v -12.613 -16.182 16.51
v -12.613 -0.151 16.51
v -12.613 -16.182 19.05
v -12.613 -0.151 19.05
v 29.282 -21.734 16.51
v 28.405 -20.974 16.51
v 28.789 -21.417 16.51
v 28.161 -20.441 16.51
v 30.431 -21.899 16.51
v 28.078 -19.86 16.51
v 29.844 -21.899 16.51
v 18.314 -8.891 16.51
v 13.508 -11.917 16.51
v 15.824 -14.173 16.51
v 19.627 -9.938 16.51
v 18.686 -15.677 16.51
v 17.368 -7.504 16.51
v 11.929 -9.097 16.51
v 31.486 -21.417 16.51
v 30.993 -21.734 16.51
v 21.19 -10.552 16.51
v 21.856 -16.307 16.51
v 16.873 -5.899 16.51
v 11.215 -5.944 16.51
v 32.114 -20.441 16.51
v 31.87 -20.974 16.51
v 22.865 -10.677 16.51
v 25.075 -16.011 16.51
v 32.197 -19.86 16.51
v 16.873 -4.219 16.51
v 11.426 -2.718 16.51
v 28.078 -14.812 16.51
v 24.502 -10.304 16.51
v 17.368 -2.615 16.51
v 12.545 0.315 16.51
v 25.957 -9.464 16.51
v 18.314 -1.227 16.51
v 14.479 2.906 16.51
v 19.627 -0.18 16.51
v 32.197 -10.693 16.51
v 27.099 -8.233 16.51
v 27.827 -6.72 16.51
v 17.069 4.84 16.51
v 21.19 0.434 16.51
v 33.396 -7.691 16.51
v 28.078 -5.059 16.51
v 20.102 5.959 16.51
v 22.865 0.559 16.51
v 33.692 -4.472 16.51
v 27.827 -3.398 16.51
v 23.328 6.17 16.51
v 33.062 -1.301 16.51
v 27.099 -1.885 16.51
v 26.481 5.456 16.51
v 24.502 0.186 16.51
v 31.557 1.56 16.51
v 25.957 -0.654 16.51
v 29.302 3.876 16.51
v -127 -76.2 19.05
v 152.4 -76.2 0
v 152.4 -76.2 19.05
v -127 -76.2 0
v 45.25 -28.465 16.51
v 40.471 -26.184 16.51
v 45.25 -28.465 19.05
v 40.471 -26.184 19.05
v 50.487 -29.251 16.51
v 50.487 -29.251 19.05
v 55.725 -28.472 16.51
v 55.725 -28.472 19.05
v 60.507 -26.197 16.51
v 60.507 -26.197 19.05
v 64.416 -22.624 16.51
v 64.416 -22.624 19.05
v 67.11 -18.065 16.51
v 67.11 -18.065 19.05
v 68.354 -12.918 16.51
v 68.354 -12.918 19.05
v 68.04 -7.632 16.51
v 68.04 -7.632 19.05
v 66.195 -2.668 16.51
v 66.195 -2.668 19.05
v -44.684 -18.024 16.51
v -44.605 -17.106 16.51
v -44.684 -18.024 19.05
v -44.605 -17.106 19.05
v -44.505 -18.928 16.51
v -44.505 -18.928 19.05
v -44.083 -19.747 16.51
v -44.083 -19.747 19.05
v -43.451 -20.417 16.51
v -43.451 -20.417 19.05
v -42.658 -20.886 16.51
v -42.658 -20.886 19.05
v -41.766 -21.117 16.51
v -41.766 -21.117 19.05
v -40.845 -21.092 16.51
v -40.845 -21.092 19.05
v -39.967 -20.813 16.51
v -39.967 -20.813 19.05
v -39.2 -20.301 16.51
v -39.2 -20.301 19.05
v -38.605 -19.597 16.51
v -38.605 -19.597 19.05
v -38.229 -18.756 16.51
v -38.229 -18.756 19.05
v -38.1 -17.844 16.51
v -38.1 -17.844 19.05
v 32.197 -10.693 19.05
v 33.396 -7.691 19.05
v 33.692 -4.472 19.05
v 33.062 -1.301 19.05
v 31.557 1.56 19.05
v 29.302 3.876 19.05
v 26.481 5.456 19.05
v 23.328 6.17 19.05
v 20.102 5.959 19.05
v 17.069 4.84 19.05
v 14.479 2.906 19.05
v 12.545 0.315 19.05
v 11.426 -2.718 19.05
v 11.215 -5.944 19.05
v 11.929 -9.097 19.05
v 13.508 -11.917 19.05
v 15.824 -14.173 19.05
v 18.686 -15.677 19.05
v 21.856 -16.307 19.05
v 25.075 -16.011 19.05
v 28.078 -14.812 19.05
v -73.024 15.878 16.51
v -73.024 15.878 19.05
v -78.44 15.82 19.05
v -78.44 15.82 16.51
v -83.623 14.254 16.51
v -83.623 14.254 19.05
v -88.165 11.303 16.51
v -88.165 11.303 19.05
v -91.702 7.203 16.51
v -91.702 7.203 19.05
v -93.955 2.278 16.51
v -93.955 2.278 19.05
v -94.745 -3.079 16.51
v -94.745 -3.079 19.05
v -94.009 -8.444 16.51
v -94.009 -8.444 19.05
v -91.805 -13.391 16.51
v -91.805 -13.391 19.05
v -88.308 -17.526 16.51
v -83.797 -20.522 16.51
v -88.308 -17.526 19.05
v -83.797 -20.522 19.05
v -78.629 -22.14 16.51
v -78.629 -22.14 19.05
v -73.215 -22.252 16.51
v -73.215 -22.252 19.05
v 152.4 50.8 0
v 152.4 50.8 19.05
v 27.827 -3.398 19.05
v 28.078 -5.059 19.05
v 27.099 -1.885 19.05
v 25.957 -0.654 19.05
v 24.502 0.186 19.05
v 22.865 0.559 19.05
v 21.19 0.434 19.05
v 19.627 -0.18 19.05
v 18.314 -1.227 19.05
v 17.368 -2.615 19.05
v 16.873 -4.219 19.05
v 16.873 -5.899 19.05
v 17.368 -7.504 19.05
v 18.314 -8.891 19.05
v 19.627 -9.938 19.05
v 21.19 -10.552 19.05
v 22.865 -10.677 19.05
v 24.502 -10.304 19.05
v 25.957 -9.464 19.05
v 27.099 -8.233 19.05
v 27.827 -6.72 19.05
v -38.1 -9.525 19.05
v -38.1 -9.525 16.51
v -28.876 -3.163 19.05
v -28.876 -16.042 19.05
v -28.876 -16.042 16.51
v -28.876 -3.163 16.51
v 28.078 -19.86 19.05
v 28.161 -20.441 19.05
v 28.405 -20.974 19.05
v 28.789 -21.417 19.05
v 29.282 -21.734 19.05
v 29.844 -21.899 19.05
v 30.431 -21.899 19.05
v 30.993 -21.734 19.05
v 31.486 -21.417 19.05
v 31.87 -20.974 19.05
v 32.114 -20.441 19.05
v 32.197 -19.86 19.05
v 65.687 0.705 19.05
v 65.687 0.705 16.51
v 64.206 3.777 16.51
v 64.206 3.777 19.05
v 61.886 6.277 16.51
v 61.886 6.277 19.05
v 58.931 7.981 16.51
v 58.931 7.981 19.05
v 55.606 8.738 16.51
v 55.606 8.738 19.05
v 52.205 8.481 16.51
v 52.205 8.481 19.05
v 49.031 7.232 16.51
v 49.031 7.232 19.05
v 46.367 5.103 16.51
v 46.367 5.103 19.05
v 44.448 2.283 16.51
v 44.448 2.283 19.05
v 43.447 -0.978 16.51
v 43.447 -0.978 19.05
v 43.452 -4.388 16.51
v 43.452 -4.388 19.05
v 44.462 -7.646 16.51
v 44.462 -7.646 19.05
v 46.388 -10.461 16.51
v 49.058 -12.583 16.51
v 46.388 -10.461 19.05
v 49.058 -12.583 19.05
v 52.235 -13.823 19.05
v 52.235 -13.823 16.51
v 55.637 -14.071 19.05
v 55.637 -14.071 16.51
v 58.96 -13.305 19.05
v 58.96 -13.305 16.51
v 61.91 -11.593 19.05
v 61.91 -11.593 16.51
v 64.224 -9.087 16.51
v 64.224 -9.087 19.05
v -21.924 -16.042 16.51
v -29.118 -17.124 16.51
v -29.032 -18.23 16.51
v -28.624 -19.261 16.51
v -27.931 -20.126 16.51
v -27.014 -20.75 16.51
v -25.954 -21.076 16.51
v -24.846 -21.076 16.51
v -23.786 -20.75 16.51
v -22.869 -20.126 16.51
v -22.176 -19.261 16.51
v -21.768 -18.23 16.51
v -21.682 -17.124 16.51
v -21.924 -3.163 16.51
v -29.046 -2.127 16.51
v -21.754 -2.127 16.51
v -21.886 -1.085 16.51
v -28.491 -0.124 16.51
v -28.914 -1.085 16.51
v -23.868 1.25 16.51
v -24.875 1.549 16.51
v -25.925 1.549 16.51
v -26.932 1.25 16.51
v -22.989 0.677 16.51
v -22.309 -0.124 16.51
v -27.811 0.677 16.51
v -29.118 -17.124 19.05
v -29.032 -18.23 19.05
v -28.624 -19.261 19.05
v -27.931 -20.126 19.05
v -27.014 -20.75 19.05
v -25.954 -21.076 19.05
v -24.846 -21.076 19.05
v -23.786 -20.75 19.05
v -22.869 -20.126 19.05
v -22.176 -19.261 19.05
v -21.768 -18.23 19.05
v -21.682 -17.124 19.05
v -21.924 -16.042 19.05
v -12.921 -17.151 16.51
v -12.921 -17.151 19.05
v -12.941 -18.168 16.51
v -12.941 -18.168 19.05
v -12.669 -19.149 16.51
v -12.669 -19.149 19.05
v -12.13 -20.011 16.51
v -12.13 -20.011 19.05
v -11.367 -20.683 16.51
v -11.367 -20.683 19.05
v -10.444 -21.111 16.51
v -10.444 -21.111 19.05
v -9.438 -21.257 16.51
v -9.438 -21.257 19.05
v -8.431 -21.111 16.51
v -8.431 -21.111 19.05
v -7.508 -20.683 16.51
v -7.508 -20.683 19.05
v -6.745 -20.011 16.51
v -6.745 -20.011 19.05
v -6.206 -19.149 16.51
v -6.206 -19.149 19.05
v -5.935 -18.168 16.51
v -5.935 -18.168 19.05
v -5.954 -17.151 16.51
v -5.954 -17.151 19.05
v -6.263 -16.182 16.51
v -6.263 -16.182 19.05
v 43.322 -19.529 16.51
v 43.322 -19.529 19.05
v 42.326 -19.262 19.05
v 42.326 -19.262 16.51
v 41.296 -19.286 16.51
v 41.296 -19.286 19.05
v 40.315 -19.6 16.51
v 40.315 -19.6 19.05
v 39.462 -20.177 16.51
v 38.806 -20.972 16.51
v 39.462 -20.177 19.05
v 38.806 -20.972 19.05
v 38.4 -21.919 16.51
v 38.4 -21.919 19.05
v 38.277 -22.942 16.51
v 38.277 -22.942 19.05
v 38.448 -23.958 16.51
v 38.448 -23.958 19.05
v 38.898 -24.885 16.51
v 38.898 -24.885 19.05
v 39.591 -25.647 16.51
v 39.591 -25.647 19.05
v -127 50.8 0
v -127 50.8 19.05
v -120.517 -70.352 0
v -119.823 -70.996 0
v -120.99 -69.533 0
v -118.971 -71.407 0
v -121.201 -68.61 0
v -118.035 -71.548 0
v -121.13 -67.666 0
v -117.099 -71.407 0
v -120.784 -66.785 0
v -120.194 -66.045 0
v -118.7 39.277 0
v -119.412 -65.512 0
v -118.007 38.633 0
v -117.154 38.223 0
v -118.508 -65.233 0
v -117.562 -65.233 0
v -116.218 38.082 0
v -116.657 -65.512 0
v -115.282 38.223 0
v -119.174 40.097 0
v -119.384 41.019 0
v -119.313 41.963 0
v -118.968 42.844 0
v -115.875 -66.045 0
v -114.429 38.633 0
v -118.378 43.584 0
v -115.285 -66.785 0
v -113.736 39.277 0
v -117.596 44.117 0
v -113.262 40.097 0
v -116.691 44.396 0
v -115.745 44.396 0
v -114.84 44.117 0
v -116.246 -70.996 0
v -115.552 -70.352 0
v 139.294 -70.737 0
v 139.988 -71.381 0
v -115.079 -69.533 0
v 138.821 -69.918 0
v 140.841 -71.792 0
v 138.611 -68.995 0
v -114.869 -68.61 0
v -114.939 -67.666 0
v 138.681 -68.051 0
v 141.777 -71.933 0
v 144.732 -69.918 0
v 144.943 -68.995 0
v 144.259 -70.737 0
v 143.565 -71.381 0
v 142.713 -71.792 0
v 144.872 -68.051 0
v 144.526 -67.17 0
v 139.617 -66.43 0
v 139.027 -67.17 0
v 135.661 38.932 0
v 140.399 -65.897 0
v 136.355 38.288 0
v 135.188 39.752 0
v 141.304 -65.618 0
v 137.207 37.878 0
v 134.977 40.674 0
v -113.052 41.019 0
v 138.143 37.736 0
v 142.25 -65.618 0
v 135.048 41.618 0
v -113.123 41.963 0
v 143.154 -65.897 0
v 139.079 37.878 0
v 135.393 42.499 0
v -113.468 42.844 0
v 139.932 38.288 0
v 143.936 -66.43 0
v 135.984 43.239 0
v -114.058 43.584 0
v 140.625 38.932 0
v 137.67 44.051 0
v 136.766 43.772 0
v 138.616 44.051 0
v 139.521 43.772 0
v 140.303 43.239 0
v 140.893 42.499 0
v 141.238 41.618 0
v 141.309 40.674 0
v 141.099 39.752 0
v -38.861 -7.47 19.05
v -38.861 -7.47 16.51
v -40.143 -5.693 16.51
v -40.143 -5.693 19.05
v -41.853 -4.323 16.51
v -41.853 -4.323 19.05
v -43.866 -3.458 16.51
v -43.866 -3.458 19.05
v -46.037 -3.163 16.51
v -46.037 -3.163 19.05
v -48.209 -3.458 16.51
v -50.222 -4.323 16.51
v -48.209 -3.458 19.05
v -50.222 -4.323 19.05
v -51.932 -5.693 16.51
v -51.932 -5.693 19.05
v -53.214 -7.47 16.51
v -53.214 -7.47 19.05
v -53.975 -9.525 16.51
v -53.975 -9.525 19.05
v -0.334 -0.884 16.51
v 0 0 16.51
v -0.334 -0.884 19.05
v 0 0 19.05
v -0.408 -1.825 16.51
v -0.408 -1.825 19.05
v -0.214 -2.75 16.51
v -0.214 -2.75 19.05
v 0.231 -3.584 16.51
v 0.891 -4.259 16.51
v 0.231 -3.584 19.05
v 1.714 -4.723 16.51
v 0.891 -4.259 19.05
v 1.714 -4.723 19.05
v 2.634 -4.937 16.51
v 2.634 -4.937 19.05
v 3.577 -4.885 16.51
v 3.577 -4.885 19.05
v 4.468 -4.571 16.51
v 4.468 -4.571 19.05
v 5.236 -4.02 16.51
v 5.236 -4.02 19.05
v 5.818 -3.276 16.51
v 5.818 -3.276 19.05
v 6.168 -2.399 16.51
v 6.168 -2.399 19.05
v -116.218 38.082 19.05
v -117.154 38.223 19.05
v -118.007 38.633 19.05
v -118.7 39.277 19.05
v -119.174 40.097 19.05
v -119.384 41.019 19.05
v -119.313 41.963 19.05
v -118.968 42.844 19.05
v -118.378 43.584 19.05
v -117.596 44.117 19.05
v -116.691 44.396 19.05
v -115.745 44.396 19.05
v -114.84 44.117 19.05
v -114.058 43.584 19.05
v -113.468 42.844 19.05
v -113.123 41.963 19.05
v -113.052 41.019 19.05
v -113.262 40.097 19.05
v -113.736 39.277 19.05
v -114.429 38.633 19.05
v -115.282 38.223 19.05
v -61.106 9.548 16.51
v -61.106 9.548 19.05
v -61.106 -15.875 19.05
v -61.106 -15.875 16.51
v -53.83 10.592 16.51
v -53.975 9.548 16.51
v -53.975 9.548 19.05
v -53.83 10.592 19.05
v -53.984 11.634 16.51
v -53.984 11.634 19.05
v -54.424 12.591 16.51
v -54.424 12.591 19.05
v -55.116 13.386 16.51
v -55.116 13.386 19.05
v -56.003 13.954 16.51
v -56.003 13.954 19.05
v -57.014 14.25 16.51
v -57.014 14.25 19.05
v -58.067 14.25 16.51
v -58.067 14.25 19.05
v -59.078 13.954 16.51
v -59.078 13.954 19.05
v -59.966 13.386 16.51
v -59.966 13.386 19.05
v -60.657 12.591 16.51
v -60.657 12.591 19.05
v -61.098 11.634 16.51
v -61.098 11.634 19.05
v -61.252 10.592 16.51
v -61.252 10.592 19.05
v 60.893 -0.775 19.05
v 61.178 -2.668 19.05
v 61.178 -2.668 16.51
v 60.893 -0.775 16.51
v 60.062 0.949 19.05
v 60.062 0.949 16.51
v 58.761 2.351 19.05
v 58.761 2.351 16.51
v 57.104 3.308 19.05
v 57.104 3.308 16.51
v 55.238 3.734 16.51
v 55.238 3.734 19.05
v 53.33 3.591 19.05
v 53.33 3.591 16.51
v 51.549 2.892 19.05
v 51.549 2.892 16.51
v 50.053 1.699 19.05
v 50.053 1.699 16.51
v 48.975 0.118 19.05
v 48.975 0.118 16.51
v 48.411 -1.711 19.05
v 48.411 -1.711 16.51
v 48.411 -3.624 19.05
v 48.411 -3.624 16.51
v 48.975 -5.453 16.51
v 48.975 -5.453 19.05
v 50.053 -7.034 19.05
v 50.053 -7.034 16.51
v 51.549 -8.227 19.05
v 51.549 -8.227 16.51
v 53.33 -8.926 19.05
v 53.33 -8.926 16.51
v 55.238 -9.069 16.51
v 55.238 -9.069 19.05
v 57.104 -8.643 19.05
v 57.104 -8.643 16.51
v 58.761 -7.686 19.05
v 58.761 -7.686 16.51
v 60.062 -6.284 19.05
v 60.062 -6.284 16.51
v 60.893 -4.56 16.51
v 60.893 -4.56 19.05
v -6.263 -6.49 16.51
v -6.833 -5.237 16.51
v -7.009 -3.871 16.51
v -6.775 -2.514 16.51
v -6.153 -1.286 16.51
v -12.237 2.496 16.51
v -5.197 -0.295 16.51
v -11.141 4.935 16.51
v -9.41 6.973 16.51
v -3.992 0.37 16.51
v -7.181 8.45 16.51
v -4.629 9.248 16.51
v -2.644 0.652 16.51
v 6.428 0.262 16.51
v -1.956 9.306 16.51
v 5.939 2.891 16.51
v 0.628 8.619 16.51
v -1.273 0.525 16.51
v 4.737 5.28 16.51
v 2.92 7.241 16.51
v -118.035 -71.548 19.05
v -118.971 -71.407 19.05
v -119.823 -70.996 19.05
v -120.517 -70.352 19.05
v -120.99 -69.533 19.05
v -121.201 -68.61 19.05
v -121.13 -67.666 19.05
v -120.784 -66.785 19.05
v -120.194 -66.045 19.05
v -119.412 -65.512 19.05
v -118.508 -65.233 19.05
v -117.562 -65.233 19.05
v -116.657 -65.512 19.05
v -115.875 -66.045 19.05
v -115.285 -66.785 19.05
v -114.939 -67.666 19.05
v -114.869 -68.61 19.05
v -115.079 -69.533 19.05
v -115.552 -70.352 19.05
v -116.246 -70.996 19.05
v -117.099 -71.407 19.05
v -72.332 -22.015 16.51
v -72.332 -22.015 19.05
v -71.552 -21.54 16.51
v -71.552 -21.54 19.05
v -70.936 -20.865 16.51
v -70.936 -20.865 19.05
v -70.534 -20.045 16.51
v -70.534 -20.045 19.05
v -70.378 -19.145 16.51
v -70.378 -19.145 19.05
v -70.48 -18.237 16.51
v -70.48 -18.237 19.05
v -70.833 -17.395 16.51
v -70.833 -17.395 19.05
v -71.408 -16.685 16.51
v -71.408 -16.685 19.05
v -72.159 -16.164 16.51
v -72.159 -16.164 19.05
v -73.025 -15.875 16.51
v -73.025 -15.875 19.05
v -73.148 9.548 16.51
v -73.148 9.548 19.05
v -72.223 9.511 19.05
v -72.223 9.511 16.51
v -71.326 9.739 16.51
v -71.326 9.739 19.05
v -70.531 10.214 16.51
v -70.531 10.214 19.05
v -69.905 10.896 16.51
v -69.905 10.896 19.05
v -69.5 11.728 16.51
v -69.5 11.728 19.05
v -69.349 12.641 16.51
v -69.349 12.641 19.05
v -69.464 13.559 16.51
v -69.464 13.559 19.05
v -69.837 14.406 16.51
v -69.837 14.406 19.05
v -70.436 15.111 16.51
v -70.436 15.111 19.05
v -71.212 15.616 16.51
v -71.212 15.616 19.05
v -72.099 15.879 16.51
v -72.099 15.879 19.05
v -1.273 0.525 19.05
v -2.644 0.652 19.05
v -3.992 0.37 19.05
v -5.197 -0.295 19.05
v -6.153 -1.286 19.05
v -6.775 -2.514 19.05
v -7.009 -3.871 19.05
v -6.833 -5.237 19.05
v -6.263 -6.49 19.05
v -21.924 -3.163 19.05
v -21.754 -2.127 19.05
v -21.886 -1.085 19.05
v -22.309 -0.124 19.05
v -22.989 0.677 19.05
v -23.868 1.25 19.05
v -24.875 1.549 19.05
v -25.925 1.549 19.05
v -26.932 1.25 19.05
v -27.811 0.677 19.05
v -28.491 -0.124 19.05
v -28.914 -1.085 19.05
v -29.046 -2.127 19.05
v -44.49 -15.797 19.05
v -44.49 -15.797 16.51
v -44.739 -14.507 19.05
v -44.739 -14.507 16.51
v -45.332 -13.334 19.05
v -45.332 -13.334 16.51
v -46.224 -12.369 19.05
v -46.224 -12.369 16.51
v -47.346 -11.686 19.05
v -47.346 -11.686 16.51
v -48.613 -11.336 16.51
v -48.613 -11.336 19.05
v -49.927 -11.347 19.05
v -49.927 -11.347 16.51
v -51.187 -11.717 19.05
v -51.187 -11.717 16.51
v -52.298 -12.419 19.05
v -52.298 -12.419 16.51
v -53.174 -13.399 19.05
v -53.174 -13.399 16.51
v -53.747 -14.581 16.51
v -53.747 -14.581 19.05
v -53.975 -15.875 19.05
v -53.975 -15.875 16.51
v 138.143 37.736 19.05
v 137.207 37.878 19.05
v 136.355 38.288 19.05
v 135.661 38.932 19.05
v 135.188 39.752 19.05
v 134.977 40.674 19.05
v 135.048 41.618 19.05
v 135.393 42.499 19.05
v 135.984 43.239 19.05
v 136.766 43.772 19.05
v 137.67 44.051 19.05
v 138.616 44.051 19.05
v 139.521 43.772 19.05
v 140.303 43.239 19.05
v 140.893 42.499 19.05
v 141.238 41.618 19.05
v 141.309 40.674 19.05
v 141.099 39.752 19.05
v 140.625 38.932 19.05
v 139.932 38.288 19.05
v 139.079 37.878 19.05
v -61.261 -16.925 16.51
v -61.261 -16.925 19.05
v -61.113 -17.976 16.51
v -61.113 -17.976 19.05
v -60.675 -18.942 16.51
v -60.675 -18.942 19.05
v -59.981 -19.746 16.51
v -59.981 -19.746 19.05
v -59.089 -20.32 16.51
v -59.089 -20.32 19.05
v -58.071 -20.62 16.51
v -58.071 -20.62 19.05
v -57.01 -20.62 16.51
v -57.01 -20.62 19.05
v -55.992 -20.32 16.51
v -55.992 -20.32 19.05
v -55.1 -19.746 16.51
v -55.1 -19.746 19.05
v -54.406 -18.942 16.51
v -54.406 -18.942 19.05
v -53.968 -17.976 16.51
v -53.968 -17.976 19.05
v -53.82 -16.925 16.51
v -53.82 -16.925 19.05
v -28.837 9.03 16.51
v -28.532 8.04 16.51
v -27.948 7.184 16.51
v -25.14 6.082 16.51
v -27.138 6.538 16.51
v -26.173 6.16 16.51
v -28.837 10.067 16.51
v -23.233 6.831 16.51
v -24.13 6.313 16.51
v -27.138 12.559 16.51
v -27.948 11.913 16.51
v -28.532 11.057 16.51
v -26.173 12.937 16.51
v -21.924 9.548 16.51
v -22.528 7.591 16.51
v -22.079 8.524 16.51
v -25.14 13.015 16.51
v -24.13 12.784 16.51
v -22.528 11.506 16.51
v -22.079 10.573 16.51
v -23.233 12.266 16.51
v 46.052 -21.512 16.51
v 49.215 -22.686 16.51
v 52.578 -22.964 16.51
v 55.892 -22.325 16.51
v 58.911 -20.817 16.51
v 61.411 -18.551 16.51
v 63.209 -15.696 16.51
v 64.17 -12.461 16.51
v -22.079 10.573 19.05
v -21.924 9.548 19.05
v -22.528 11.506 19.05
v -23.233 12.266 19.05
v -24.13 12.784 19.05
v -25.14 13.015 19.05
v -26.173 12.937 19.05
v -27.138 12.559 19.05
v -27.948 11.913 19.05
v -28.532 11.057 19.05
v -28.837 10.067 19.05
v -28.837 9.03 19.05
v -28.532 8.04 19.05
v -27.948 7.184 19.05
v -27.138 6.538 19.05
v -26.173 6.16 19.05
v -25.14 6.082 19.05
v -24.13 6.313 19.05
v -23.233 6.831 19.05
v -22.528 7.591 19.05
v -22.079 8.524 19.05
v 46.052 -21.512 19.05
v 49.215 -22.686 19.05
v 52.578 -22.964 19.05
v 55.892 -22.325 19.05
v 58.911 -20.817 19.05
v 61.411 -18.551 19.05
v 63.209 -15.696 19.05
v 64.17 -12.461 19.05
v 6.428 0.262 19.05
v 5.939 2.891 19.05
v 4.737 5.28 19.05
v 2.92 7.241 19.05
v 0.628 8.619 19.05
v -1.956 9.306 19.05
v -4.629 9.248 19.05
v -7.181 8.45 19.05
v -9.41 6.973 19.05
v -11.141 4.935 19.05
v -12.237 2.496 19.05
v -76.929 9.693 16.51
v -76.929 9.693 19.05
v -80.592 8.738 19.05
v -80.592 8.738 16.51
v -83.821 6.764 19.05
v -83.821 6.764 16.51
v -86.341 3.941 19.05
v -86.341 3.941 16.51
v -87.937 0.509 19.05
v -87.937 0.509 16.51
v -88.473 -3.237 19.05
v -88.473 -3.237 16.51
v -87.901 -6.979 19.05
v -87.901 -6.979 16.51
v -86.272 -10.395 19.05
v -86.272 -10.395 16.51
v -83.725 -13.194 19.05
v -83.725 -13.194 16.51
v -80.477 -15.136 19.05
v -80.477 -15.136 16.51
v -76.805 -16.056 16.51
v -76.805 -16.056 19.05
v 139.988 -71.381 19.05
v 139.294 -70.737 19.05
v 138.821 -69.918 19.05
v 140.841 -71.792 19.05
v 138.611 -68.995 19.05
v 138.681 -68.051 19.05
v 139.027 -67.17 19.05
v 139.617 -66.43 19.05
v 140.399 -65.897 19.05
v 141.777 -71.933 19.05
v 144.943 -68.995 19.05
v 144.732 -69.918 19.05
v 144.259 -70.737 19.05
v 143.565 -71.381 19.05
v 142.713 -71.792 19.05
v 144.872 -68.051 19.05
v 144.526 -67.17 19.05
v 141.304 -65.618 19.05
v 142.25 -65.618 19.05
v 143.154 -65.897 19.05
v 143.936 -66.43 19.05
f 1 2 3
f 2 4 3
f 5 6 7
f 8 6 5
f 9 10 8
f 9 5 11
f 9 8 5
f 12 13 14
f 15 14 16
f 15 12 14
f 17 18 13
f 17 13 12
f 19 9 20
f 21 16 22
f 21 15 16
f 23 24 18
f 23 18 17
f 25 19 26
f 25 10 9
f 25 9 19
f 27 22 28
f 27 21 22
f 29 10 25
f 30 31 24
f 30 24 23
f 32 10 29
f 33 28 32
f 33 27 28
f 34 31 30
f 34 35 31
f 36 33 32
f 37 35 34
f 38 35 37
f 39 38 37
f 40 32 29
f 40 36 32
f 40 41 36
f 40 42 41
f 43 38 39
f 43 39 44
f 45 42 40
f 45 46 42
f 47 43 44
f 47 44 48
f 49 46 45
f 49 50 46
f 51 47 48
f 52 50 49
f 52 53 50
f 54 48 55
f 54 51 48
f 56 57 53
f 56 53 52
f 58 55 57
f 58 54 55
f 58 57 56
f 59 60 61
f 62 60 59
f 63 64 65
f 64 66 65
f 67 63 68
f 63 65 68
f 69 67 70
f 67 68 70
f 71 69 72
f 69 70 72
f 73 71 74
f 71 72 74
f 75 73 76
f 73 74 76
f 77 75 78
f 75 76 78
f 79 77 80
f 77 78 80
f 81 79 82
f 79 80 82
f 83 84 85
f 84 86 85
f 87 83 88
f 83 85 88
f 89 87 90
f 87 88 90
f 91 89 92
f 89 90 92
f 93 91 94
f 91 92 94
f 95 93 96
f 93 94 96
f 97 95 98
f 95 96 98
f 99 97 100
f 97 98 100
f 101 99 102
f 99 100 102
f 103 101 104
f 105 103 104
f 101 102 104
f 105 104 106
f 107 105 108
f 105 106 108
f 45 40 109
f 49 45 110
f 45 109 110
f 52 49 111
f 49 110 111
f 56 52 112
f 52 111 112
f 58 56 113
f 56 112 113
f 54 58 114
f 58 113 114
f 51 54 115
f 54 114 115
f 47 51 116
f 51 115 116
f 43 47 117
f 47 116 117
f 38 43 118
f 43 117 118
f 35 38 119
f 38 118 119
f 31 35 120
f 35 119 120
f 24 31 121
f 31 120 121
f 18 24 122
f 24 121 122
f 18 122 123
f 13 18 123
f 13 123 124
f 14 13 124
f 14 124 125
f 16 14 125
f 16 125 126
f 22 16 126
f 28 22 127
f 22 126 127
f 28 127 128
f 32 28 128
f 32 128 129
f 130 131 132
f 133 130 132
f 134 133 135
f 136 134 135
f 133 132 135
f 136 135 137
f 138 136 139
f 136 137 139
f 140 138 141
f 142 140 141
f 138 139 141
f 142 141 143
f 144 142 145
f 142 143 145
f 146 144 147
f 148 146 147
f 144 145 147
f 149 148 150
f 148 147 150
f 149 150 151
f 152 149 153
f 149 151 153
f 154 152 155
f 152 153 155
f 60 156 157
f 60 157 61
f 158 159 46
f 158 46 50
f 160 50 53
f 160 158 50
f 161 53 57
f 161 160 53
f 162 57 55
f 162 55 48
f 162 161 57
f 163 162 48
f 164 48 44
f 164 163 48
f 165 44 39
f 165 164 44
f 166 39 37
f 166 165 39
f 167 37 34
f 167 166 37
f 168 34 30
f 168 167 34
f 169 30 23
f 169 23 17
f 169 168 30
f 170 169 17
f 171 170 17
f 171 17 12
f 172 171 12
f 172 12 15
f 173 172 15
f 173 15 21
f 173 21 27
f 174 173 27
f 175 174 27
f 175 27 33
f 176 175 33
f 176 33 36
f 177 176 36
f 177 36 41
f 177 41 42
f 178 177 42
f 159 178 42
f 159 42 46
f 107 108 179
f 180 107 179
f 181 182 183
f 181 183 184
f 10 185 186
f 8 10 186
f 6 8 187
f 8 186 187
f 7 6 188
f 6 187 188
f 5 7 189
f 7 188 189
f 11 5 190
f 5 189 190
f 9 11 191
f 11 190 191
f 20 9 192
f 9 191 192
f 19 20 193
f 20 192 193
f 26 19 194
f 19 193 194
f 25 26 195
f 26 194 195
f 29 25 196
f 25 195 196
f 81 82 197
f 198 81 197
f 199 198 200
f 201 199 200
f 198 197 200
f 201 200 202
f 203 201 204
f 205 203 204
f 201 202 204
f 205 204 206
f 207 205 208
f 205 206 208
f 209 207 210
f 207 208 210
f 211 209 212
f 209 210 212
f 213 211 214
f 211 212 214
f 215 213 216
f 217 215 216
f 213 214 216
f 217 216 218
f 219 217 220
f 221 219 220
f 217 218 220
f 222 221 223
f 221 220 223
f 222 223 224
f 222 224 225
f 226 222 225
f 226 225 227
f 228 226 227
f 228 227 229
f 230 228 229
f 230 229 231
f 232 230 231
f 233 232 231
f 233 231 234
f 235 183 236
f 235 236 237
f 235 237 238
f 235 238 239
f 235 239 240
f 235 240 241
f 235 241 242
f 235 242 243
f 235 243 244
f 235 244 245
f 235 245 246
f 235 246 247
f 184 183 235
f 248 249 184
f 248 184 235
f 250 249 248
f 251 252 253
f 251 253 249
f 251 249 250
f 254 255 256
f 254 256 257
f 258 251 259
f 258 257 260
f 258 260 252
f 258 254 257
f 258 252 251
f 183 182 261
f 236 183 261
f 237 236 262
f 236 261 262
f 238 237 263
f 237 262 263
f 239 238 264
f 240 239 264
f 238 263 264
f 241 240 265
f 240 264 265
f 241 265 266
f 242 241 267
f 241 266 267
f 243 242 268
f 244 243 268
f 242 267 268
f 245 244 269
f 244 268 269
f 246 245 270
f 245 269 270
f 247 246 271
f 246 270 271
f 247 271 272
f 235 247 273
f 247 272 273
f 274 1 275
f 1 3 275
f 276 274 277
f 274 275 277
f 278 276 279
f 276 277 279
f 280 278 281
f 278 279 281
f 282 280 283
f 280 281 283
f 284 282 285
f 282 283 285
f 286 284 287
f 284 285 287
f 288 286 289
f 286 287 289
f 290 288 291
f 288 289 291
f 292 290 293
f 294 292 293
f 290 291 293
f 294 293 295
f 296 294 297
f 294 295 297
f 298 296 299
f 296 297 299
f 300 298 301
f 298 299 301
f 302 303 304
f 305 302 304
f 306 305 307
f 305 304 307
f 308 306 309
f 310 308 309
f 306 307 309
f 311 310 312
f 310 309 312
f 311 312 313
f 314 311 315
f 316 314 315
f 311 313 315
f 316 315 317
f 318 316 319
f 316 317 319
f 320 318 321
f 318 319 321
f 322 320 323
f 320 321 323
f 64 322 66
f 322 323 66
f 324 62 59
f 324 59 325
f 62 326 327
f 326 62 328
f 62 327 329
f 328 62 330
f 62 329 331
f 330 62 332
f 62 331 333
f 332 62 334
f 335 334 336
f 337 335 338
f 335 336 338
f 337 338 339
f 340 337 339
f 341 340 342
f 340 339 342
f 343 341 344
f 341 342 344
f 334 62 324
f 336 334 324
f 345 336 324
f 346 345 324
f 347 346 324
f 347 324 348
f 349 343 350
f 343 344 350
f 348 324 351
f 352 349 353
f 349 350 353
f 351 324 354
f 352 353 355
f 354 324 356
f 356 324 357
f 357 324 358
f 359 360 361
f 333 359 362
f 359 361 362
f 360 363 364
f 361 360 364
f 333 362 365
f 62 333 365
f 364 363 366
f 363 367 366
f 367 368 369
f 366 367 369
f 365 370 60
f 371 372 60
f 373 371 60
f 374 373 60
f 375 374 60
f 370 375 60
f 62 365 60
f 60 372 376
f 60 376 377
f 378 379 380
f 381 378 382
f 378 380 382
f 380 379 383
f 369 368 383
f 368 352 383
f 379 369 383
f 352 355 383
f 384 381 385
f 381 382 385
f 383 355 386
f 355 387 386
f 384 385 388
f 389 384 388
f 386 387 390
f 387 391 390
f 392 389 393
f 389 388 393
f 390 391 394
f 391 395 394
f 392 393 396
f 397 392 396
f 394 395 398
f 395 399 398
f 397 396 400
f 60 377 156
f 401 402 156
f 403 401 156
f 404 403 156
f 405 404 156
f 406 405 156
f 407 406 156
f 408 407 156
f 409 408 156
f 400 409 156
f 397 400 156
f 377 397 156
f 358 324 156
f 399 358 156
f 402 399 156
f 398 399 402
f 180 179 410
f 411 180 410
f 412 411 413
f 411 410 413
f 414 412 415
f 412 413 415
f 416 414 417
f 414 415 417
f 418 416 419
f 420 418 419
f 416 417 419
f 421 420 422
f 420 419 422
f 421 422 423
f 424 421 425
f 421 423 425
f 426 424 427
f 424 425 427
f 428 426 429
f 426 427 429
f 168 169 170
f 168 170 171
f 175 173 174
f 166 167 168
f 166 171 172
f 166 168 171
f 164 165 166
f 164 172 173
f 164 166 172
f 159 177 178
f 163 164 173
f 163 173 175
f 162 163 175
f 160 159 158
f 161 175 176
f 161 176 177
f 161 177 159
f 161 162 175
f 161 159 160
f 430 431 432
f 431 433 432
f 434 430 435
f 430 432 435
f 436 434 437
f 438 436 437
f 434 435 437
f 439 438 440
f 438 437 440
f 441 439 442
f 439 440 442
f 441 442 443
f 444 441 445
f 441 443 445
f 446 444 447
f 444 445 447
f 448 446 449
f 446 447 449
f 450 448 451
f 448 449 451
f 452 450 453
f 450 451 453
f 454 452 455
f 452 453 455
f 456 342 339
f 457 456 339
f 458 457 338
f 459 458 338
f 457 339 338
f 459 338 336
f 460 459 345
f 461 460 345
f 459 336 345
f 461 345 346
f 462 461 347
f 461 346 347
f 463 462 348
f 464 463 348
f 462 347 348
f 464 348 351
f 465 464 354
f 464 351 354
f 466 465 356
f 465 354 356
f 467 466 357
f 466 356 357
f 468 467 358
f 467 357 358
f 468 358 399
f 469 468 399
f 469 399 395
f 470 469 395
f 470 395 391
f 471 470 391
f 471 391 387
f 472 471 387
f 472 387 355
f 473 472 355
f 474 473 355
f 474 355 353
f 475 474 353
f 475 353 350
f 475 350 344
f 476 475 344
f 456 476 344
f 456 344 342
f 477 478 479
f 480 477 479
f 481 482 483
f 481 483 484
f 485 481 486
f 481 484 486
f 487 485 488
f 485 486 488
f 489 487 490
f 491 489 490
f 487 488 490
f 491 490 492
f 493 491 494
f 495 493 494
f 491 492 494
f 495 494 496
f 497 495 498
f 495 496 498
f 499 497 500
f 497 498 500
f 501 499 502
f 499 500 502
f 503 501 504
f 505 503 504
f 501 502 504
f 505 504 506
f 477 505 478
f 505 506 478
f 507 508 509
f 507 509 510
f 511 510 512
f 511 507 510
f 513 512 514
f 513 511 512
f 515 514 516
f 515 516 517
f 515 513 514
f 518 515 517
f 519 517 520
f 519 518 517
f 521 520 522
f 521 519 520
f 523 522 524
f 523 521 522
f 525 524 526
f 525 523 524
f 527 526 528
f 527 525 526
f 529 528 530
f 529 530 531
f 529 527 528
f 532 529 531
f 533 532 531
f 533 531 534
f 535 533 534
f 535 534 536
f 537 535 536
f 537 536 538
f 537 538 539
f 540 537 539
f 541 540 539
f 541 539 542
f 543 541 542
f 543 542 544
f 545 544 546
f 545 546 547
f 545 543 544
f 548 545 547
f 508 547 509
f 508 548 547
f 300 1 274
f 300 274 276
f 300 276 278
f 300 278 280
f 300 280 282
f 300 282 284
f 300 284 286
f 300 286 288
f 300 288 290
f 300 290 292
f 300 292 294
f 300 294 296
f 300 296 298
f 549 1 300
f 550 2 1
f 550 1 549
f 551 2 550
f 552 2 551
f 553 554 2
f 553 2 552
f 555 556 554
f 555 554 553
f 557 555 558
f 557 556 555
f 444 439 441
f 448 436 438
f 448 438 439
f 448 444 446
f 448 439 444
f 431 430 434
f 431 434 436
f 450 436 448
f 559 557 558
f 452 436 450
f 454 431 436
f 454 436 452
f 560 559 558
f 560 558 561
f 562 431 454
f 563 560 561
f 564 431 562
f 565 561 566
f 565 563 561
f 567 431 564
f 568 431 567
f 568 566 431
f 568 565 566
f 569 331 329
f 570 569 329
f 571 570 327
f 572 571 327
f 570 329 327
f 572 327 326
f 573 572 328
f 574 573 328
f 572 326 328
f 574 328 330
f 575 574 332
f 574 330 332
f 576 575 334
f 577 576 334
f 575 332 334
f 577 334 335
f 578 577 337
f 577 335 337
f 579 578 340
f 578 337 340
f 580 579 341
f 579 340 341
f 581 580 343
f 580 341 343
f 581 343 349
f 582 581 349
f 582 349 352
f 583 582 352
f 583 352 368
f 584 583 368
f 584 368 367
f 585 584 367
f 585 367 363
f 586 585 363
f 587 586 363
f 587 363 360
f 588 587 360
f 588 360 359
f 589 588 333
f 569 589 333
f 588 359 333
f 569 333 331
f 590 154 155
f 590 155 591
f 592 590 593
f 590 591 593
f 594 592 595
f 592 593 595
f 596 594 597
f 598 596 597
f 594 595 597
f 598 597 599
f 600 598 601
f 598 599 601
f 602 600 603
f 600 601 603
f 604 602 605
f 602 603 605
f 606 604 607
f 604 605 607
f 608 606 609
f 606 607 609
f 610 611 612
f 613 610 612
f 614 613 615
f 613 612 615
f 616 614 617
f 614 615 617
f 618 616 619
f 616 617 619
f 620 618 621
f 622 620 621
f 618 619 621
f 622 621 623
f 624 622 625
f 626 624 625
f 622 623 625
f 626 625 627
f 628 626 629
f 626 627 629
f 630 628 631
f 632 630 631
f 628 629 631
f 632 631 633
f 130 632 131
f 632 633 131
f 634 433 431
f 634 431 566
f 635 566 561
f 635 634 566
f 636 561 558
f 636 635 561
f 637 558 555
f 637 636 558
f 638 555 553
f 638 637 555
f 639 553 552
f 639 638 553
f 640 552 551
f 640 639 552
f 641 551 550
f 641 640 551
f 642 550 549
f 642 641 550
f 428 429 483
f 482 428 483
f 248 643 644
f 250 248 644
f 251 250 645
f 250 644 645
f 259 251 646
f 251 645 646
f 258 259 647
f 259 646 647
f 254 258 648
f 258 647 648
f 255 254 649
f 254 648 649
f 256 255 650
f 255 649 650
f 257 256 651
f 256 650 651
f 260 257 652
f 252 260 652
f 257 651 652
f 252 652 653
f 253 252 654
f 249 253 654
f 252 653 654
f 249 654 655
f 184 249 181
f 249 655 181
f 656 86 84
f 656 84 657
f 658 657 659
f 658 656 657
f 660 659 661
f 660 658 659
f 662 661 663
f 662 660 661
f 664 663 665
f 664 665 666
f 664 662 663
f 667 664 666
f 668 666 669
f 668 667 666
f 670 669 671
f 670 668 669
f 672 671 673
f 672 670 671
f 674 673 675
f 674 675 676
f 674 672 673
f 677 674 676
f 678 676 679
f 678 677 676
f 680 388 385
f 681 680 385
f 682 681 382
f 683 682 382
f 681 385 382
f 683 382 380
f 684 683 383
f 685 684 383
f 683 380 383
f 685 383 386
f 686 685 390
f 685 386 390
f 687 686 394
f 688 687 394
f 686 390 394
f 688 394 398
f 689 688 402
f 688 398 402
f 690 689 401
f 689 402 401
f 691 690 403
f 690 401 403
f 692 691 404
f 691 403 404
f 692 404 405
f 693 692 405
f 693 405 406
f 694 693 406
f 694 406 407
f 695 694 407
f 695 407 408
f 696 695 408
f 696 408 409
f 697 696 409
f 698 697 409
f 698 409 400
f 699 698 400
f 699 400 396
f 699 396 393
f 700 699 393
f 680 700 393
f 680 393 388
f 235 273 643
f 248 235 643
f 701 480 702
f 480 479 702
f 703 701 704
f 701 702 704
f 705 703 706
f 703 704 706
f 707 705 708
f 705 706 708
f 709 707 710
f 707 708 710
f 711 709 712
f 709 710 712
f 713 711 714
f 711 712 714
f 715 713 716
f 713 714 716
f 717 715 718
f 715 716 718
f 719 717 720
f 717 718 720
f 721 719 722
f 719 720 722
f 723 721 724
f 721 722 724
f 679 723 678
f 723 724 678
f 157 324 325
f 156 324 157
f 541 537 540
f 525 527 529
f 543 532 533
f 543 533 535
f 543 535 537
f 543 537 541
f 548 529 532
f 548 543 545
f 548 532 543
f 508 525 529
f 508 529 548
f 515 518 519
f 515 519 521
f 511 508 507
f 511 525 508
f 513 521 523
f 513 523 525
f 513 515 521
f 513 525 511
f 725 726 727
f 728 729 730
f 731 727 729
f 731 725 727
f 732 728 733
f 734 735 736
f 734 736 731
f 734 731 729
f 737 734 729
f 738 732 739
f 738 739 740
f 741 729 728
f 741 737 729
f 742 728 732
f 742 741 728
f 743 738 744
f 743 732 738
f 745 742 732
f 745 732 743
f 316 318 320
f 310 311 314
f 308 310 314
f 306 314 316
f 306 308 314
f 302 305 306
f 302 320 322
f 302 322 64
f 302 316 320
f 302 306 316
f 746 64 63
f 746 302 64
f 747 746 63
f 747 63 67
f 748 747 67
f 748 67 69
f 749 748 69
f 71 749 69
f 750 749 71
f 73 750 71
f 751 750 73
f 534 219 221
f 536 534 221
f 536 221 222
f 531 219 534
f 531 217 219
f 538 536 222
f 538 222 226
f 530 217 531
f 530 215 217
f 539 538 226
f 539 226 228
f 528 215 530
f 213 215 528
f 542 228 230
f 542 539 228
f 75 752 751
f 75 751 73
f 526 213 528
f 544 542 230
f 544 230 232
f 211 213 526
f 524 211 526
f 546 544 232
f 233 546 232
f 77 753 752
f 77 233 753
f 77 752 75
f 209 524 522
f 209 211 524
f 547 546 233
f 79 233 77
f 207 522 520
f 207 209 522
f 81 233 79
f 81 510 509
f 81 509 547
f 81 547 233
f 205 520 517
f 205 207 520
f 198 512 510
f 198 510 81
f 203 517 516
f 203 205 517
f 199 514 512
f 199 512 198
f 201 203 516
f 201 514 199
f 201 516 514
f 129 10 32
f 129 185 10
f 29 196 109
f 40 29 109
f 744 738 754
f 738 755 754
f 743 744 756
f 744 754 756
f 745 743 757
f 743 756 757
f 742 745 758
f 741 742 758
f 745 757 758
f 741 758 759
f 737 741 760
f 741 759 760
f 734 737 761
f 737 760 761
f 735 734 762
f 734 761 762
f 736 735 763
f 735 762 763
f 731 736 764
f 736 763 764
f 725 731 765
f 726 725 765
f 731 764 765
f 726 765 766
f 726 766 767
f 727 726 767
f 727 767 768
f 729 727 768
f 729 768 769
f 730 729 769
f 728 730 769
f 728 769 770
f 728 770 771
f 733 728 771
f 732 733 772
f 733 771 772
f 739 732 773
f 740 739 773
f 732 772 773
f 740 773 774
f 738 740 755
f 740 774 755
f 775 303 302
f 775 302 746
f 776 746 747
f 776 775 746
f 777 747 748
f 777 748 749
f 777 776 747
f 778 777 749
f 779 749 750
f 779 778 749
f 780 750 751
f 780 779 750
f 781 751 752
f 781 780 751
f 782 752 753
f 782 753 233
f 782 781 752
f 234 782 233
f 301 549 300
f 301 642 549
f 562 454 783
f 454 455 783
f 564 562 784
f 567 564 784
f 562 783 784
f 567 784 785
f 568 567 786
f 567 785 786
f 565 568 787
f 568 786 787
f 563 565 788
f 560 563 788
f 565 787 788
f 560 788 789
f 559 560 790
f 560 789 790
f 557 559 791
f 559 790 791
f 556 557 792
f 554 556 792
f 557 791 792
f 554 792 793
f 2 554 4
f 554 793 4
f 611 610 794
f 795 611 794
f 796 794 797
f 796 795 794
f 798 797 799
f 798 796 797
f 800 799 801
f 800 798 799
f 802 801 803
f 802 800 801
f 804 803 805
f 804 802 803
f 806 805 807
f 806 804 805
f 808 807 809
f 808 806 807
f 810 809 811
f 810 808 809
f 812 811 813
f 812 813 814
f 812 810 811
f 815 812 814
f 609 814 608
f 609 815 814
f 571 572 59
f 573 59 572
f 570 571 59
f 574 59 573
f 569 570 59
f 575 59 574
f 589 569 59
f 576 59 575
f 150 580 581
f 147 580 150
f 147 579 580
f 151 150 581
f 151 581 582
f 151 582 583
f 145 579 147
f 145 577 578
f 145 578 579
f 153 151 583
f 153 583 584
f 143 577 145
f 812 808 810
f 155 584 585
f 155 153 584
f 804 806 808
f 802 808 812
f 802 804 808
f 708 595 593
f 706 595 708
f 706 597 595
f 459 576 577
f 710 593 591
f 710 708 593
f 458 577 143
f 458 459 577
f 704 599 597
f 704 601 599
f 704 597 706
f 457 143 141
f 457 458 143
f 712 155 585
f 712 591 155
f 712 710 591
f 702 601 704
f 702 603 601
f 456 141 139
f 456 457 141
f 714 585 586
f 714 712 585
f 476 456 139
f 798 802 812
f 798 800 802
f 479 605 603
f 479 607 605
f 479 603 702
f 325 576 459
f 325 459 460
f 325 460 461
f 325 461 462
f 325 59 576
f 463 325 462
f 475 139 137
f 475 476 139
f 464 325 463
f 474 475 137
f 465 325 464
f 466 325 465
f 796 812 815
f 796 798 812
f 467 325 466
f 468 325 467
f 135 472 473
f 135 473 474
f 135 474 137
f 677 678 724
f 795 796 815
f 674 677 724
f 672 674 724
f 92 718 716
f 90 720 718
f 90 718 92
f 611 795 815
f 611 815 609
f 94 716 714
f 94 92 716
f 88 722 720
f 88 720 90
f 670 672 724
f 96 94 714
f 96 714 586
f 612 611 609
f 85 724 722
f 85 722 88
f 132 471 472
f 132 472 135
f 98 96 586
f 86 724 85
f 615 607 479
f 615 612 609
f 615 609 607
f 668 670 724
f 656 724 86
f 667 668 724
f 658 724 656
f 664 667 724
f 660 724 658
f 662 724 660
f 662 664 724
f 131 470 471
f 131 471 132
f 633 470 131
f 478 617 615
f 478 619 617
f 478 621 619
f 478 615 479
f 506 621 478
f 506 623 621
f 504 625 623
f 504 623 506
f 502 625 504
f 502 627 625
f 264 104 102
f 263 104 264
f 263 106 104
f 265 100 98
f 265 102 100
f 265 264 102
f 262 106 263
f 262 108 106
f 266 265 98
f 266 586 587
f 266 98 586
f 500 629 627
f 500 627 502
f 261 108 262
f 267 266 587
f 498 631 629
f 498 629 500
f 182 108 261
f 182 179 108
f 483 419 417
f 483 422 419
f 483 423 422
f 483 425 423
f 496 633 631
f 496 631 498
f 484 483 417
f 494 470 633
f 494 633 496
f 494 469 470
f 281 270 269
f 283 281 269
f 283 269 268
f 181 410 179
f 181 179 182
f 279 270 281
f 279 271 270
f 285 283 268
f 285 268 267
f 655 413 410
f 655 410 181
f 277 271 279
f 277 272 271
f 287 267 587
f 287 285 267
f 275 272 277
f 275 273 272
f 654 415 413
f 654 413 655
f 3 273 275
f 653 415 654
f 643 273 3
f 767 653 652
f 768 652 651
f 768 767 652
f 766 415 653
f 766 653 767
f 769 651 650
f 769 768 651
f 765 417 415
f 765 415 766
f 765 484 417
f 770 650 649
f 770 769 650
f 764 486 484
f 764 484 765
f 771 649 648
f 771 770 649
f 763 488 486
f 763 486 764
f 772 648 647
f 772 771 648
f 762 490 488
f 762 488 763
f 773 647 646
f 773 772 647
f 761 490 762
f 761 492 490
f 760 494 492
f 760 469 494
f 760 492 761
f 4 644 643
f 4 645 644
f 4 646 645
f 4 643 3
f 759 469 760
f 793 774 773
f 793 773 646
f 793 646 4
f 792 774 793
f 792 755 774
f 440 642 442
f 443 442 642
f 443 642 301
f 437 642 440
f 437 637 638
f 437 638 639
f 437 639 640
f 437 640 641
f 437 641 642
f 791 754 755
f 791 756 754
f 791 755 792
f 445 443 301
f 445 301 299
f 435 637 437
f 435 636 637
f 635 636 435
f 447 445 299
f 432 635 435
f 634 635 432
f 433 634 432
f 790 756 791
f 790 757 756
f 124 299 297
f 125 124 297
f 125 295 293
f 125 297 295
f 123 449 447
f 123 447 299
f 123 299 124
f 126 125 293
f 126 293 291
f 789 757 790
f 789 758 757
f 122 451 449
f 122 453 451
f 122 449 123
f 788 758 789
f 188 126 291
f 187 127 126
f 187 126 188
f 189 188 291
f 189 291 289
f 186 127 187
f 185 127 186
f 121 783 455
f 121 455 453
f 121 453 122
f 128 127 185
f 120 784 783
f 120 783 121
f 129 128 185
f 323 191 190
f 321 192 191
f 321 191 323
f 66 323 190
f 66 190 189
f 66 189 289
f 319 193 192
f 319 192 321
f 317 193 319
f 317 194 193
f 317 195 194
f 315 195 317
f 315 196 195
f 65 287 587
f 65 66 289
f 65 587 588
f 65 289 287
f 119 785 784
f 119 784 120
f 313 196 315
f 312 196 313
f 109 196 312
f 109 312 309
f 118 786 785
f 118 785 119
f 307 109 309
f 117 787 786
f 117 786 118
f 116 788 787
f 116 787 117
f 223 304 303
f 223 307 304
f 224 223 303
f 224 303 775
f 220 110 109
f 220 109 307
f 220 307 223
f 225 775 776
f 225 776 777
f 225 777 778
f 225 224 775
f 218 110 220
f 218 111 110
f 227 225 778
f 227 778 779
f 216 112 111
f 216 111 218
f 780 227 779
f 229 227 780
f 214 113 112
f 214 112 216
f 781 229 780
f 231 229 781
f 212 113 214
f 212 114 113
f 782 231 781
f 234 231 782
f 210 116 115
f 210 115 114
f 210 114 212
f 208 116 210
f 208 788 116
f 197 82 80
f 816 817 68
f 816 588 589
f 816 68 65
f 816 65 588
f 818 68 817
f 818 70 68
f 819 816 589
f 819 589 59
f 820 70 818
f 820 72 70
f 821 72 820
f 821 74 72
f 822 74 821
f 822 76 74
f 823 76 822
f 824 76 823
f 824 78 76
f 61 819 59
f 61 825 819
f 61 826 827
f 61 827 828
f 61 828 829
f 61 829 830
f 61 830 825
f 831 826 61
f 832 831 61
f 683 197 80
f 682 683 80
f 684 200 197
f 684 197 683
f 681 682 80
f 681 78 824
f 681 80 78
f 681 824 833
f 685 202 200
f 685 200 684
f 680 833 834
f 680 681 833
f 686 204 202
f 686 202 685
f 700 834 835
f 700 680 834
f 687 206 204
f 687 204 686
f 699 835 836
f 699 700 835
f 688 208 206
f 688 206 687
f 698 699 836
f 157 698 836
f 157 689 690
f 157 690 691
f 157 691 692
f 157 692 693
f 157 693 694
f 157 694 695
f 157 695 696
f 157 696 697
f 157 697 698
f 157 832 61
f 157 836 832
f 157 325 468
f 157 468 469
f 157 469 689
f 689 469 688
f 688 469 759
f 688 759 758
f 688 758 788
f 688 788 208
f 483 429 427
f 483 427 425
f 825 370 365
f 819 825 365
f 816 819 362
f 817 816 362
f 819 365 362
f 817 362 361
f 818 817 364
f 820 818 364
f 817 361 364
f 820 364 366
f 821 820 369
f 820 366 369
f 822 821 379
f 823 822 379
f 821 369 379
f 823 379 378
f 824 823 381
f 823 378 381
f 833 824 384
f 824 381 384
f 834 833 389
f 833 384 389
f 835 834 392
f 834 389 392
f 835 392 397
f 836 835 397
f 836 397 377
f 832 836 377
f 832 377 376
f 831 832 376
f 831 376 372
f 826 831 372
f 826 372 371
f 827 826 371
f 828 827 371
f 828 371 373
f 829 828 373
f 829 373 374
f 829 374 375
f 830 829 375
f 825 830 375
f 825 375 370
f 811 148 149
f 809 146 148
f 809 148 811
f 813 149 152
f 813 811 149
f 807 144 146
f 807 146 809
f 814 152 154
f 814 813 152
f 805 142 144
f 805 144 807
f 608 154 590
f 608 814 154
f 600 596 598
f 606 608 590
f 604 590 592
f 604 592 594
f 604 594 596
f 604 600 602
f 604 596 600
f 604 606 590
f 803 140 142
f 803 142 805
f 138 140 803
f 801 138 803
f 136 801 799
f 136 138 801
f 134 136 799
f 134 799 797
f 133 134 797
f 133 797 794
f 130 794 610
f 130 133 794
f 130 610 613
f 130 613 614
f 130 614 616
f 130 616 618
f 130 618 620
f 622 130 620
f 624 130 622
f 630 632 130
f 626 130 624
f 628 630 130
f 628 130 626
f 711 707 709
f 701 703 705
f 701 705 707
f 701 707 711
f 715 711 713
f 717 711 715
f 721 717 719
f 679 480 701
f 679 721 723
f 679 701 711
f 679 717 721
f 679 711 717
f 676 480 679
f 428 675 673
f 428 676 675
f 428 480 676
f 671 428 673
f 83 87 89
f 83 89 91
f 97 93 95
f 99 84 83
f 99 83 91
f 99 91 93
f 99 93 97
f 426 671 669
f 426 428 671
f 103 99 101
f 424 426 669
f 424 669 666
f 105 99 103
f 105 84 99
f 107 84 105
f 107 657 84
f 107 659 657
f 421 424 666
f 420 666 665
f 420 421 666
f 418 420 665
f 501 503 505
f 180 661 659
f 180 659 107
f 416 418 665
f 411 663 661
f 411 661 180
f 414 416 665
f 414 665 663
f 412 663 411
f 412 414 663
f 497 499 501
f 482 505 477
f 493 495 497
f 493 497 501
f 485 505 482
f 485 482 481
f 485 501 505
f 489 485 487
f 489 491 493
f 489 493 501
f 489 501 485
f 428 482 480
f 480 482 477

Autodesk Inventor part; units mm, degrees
ref_plane "YZ Plane" through (0, 0, 0) normal (1, 0, 0) x (0, 1, 0)
ref_plane "XZ Plane" through (0, 0, 0) normal (0, 1, 0) x (-1, 0, 0)
ref_plane "XY Plane" through (0, 0, 0) normal (0, 0, 1) x (1, 0, 0)
sketch "Sketch1" plane through (0, 0, 0) normal (0, 0, 1) x (1, 0, 0)
  line L0 (-127, 50.8) -> (152.4, 50.8)
  line L1 (152.4, 50.8) -> (152.4, -76.2)
  line L2 (152.4, -76.2) -> (-127, -76.2)
  line L3 (-127, -76.2) -> (-127, 50.8)
  point P0 (0, 0)
  dimension "d0" = 127
  dimension "d1" = 279.4
extrude "Extrusion1" add sketch "Sketch1" along normal blind 19.05
sketch "Sketch2" plane through (0, 0, 19.05) normal (0, 0, 1) x (1, 0, 0)
  arc A0 (-73.0244, 15.878) -> (-73.0246, -22.228) centre (-75.5284, -3.175) ccw
  arc A1 (-73.1475, 9.5485) -> (-73.025, -15.875) centre (-75.5284, -3.175) ccw
  arc A2 (-73.1475, 9.5485) -> (-73.0244, 15.878) centre (-72.5572, 12.703) ccw
  arc A3 (-73.2146, -22.252) -> (-73.025, -15.875) centre (-73.603, -19.0491) ccw
  line L0 (-61.1063, -15.875) -> (-61.1063, 9.5485)
  arc A4 (-61.1063, -15.875) -> (-53.975, -15.875) centre (-57.5407, -16.9375) ccw
  arc A5 (-53.975, 9.5485) -> (-61.1063, 9.5485) centre (-57.5407, 10.5766) ccw
  line L1 (-53.975, 9.5485) -> (-53.975, -9.525)
  arc A6 (-38.1, -9.525) -> (-53.975, -9.525) centre (-46.0375, -11.2959) ccw
  line L2 (-38.1, -9.525) -> (-38.1, -17.8441)
  arc A7 (-44.6048, -17.106) -> (-38.1, -17.8441) centre (-41.3943, -17.8441) ccw
  arc A8 (-44.6048, -17.106) -> (-53.975, -15.875) centre (-49.231, -16.0424) ccw
  circle A9 centre (-25.4, 9.5485) radius 3.4758
  arc A10 (-28.8758, -16.0424) -> (-21.9242, -16.0424) centre (-25.4, -17.3897) ccw
  arc A11 (-21.9242, -3.1632) -> (-28.8758, -3.1632) centre (-25.4, -2.0594) ccw
  line L3 (-28.8758, -3.1632) -> (-28.8758, -16.0424)
  line L4 (-21.9242, -3.1632) -> (-21.9242, -16.0424)
  arc A12 (-12.6126, -16.1823) -> (-6.2626, -16.1823) centre (-9.4376, -17.7266) ccw
  line L5 (-12.6126, -16.1823) -> (-12.6126, -0.1511)
  arc A13 (6.1684, -2.399) -> (-12.6126, -0.1511) centre (-3.0876, -0.1511) ccw
  line L6 (-6.2626, -16.1823) -> (-6.2626, -6.4899)
  arc A14 (0, 0) -> (6.1684, -2.399) centre (2.9241, -1.6111) ccw
  arc A15 (0, 0) -> (-6.2626, -6.4899) centre (-2.3813, -3.9688) ccw
  circle A16 centre (22.4437, -5.0591) radius 11.2637
  circle A17 centre (22.4437, -5.0591) radius 5.6341
  line L7 (28.0778, -14.8125) -> (28.0778, -19.8605)
  line L8 (32.1971, -10.6931) -> (32.1971, -19.8605)
  arc A18 (28.0778, -19.8605) -> (32.1971, -19.8605) centre (30.1375, -19.8605) ccw
  circle A19 centre (54.7585, -2.6676) radius 11.4369
  circle A20 centre (54.7585, -2.6676) radius 6.4193
  arc A21 (43.3216, -19.5287) -> (64.2241, -9.0869) centre (51.9093, -10.5775) ccw
  arc A22 (43.3216, -19.5287) -> (40.471, -26.1835) centre (41.8963, -22.8561) ccw
  arc A23 (40.471, -26.1835) -> (66.1955, -2.6676) centre (50.4992, -11.3254) ccw
emboss "Emboss1" sketch "Sketch2" operation cut depth 2.54 direction (0, 0, -1)
hole "Hole1" at (-116.218, 41.2565, 19.05) direction (0, 0, -1) diameter 6.35 end through all
hole "Hole2" at (-118.0348, -68.3727, 19.05) direction (0, 0, -1) diameter 6.35 end through all
hole "Hole3" at (138.1431, 40.9115, 19.05) direction (0, 0, -1) diameter 6.35 end through all
hole "Hole4" at (141.7768, -68.7579, 19.05) direction (0, 0, -1) diameter 6.35 end through all
properties part number "NameTag"
